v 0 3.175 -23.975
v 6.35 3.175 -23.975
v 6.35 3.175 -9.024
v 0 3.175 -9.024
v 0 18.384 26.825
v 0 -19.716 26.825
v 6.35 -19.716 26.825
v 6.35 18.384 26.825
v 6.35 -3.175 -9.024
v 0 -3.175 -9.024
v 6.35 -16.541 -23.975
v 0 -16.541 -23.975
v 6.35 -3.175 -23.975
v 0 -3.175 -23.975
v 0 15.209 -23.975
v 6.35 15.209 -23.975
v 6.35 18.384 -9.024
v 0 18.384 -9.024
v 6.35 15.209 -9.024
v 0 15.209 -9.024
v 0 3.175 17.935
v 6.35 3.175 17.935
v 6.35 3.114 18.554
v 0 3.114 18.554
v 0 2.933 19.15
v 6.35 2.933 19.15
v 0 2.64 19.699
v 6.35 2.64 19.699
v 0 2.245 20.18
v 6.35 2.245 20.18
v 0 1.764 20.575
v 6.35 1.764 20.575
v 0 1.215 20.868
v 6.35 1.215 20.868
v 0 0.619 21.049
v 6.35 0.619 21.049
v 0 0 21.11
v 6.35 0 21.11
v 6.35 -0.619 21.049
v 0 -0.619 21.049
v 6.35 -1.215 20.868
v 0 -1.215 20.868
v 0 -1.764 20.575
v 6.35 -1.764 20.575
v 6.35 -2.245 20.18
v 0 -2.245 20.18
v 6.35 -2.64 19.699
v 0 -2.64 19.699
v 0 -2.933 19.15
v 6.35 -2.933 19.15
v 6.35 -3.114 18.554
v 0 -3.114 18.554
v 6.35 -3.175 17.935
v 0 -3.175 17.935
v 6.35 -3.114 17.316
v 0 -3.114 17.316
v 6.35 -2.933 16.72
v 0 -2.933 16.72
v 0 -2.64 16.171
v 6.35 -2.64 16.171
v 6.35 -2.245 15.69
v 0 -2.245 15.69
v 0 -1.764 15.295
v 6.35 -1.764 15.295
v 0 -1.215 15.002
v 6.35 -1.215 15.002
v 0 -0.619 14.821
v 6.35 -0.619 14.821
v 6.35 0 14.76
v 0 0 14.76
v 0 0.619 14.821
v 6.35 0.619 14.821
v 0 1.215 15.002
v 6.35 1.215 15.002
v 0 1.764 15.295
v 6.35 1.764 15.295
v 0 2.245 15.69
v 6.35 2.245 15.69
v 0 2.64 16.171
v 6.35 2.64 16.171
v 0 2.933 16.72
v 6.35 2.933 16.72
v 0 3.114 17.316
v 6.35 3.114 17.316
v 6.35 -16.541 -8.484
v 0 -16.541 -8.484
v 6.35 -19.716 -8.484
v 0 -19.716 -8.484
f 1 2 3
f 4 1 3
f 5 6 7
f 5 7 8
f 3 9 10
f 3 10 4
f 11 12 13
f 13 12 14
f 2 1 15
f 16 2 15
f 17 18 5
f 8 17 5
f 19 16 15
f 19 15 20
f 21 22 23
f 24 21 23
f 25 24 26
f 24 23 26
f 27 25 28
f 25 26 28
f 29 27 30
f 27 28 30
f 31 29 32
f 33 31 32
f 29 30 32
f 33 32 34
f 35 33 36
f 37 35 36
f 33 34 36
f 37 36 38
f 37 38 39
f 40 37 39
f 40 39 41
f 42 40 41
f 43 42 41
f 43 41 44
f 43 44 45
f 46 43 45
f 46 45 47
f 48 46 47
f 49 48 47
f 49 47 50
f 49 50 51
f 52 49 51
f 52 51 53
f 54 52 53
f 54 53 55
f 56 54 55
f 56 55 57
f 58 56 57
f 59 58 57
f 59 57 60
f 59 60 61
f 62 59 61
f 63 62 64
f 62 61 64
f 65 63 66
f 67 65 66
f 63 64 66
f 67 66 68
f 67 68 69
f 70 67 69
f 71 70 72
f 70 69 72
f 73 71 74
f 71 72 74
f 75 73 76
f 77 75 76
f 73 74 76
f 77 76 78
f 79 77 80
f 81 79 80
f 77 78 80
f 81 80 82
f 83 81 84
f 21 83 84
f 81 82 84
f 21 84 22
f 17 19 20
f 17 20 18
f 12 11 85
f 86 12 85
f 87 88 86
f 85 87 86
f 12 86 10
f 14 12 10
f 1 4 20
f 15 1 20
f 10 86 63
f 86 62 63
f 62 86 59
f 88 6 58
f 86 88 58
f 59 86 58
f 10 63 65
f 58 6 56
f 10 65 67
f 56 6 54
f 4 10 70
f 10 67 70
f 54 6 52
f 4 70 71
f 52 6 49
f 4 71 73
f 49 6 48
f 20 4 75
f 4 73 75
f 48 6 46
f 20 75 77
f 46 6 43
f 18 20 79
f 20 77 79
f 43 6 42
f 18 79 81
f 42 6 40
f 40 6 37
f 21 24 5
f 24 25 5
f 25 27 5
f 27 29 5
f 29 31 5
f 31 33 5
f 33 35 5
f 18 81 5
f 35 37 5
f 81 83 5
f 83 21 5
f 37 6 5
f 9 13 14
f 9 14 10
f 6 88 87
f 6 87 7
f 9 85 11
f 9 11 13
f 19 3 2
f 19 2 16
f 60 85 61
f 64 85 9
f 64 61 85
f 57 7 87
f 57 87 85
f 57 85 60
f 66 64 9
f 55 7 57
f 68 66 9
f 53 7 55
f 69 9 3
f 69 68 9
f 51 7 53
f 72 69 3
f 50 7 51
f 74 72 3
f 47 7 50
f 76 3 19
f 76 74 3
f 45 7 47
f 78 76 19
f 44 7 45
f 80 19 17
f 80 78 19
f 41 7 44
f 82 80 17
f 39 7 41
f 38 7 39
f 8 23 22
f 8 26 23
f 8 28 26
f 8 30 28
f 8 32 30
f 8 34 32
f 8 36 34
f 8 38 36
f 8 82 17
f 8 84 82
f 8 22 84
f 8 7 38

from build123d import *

# Parameters (mm, degrees)
F0_W     = 38.1
F0_H     = 50.8
F1_DEPTH = 6.35
F2_R     = 3.175
F3_DEPTH = 6.351
F4_W     = 3.175
F4_H     = 15.490544
F4_H_2   = 14.951406
F5_DEPTH = 6.351
F6_W     = 6.35
F6_H     = 14.951406
F7_DEPTH = 6.351


with BuildPart() as f1:
    # F0 (on Right) → F1 (new body)
    with BuildSketch(Plane.YZ):
        with Locations((-0.666162, 1.42497)):
            Rectangle(F0_W, F0_H)
    extrude(amount=F1_DEPTH)

    # F2 (on face) → F3 (cut, through all)
    with BuildSketch(Plane.YZ.offset(6.35)):
        with Locations((0, 17.93497)):
            Circle(F2_R)
    extrude(amount=-F3_DEPTH, mode=Mode.SUBTRACT)

    # F4 (on face) → F5 (cut, through all)
    with BuildSketch(Plane.YZ.offset(6.35)):
        with Locations((-18.128662, -16.229758)):
            Rectangle(F4_W, F4_H)
        with Locations((16.796338, -16.499327)):
            Rectangle(F4_W, F4_H_2)
    extrude(amount=-F5_DEPTH, mode=Mode.SUBTRACT)

    # F6 (on face) → F7 (cut, through all)
    with BuildSketch(Plane.YZ.offset(6.35)):
        with Locations((0, -16.499327)):
            Rectangle(F6_W, F6_H)
    extrude(amount=-F7_DEPTH, mode=Mode.SUBTRACT)


solid = f1.part
